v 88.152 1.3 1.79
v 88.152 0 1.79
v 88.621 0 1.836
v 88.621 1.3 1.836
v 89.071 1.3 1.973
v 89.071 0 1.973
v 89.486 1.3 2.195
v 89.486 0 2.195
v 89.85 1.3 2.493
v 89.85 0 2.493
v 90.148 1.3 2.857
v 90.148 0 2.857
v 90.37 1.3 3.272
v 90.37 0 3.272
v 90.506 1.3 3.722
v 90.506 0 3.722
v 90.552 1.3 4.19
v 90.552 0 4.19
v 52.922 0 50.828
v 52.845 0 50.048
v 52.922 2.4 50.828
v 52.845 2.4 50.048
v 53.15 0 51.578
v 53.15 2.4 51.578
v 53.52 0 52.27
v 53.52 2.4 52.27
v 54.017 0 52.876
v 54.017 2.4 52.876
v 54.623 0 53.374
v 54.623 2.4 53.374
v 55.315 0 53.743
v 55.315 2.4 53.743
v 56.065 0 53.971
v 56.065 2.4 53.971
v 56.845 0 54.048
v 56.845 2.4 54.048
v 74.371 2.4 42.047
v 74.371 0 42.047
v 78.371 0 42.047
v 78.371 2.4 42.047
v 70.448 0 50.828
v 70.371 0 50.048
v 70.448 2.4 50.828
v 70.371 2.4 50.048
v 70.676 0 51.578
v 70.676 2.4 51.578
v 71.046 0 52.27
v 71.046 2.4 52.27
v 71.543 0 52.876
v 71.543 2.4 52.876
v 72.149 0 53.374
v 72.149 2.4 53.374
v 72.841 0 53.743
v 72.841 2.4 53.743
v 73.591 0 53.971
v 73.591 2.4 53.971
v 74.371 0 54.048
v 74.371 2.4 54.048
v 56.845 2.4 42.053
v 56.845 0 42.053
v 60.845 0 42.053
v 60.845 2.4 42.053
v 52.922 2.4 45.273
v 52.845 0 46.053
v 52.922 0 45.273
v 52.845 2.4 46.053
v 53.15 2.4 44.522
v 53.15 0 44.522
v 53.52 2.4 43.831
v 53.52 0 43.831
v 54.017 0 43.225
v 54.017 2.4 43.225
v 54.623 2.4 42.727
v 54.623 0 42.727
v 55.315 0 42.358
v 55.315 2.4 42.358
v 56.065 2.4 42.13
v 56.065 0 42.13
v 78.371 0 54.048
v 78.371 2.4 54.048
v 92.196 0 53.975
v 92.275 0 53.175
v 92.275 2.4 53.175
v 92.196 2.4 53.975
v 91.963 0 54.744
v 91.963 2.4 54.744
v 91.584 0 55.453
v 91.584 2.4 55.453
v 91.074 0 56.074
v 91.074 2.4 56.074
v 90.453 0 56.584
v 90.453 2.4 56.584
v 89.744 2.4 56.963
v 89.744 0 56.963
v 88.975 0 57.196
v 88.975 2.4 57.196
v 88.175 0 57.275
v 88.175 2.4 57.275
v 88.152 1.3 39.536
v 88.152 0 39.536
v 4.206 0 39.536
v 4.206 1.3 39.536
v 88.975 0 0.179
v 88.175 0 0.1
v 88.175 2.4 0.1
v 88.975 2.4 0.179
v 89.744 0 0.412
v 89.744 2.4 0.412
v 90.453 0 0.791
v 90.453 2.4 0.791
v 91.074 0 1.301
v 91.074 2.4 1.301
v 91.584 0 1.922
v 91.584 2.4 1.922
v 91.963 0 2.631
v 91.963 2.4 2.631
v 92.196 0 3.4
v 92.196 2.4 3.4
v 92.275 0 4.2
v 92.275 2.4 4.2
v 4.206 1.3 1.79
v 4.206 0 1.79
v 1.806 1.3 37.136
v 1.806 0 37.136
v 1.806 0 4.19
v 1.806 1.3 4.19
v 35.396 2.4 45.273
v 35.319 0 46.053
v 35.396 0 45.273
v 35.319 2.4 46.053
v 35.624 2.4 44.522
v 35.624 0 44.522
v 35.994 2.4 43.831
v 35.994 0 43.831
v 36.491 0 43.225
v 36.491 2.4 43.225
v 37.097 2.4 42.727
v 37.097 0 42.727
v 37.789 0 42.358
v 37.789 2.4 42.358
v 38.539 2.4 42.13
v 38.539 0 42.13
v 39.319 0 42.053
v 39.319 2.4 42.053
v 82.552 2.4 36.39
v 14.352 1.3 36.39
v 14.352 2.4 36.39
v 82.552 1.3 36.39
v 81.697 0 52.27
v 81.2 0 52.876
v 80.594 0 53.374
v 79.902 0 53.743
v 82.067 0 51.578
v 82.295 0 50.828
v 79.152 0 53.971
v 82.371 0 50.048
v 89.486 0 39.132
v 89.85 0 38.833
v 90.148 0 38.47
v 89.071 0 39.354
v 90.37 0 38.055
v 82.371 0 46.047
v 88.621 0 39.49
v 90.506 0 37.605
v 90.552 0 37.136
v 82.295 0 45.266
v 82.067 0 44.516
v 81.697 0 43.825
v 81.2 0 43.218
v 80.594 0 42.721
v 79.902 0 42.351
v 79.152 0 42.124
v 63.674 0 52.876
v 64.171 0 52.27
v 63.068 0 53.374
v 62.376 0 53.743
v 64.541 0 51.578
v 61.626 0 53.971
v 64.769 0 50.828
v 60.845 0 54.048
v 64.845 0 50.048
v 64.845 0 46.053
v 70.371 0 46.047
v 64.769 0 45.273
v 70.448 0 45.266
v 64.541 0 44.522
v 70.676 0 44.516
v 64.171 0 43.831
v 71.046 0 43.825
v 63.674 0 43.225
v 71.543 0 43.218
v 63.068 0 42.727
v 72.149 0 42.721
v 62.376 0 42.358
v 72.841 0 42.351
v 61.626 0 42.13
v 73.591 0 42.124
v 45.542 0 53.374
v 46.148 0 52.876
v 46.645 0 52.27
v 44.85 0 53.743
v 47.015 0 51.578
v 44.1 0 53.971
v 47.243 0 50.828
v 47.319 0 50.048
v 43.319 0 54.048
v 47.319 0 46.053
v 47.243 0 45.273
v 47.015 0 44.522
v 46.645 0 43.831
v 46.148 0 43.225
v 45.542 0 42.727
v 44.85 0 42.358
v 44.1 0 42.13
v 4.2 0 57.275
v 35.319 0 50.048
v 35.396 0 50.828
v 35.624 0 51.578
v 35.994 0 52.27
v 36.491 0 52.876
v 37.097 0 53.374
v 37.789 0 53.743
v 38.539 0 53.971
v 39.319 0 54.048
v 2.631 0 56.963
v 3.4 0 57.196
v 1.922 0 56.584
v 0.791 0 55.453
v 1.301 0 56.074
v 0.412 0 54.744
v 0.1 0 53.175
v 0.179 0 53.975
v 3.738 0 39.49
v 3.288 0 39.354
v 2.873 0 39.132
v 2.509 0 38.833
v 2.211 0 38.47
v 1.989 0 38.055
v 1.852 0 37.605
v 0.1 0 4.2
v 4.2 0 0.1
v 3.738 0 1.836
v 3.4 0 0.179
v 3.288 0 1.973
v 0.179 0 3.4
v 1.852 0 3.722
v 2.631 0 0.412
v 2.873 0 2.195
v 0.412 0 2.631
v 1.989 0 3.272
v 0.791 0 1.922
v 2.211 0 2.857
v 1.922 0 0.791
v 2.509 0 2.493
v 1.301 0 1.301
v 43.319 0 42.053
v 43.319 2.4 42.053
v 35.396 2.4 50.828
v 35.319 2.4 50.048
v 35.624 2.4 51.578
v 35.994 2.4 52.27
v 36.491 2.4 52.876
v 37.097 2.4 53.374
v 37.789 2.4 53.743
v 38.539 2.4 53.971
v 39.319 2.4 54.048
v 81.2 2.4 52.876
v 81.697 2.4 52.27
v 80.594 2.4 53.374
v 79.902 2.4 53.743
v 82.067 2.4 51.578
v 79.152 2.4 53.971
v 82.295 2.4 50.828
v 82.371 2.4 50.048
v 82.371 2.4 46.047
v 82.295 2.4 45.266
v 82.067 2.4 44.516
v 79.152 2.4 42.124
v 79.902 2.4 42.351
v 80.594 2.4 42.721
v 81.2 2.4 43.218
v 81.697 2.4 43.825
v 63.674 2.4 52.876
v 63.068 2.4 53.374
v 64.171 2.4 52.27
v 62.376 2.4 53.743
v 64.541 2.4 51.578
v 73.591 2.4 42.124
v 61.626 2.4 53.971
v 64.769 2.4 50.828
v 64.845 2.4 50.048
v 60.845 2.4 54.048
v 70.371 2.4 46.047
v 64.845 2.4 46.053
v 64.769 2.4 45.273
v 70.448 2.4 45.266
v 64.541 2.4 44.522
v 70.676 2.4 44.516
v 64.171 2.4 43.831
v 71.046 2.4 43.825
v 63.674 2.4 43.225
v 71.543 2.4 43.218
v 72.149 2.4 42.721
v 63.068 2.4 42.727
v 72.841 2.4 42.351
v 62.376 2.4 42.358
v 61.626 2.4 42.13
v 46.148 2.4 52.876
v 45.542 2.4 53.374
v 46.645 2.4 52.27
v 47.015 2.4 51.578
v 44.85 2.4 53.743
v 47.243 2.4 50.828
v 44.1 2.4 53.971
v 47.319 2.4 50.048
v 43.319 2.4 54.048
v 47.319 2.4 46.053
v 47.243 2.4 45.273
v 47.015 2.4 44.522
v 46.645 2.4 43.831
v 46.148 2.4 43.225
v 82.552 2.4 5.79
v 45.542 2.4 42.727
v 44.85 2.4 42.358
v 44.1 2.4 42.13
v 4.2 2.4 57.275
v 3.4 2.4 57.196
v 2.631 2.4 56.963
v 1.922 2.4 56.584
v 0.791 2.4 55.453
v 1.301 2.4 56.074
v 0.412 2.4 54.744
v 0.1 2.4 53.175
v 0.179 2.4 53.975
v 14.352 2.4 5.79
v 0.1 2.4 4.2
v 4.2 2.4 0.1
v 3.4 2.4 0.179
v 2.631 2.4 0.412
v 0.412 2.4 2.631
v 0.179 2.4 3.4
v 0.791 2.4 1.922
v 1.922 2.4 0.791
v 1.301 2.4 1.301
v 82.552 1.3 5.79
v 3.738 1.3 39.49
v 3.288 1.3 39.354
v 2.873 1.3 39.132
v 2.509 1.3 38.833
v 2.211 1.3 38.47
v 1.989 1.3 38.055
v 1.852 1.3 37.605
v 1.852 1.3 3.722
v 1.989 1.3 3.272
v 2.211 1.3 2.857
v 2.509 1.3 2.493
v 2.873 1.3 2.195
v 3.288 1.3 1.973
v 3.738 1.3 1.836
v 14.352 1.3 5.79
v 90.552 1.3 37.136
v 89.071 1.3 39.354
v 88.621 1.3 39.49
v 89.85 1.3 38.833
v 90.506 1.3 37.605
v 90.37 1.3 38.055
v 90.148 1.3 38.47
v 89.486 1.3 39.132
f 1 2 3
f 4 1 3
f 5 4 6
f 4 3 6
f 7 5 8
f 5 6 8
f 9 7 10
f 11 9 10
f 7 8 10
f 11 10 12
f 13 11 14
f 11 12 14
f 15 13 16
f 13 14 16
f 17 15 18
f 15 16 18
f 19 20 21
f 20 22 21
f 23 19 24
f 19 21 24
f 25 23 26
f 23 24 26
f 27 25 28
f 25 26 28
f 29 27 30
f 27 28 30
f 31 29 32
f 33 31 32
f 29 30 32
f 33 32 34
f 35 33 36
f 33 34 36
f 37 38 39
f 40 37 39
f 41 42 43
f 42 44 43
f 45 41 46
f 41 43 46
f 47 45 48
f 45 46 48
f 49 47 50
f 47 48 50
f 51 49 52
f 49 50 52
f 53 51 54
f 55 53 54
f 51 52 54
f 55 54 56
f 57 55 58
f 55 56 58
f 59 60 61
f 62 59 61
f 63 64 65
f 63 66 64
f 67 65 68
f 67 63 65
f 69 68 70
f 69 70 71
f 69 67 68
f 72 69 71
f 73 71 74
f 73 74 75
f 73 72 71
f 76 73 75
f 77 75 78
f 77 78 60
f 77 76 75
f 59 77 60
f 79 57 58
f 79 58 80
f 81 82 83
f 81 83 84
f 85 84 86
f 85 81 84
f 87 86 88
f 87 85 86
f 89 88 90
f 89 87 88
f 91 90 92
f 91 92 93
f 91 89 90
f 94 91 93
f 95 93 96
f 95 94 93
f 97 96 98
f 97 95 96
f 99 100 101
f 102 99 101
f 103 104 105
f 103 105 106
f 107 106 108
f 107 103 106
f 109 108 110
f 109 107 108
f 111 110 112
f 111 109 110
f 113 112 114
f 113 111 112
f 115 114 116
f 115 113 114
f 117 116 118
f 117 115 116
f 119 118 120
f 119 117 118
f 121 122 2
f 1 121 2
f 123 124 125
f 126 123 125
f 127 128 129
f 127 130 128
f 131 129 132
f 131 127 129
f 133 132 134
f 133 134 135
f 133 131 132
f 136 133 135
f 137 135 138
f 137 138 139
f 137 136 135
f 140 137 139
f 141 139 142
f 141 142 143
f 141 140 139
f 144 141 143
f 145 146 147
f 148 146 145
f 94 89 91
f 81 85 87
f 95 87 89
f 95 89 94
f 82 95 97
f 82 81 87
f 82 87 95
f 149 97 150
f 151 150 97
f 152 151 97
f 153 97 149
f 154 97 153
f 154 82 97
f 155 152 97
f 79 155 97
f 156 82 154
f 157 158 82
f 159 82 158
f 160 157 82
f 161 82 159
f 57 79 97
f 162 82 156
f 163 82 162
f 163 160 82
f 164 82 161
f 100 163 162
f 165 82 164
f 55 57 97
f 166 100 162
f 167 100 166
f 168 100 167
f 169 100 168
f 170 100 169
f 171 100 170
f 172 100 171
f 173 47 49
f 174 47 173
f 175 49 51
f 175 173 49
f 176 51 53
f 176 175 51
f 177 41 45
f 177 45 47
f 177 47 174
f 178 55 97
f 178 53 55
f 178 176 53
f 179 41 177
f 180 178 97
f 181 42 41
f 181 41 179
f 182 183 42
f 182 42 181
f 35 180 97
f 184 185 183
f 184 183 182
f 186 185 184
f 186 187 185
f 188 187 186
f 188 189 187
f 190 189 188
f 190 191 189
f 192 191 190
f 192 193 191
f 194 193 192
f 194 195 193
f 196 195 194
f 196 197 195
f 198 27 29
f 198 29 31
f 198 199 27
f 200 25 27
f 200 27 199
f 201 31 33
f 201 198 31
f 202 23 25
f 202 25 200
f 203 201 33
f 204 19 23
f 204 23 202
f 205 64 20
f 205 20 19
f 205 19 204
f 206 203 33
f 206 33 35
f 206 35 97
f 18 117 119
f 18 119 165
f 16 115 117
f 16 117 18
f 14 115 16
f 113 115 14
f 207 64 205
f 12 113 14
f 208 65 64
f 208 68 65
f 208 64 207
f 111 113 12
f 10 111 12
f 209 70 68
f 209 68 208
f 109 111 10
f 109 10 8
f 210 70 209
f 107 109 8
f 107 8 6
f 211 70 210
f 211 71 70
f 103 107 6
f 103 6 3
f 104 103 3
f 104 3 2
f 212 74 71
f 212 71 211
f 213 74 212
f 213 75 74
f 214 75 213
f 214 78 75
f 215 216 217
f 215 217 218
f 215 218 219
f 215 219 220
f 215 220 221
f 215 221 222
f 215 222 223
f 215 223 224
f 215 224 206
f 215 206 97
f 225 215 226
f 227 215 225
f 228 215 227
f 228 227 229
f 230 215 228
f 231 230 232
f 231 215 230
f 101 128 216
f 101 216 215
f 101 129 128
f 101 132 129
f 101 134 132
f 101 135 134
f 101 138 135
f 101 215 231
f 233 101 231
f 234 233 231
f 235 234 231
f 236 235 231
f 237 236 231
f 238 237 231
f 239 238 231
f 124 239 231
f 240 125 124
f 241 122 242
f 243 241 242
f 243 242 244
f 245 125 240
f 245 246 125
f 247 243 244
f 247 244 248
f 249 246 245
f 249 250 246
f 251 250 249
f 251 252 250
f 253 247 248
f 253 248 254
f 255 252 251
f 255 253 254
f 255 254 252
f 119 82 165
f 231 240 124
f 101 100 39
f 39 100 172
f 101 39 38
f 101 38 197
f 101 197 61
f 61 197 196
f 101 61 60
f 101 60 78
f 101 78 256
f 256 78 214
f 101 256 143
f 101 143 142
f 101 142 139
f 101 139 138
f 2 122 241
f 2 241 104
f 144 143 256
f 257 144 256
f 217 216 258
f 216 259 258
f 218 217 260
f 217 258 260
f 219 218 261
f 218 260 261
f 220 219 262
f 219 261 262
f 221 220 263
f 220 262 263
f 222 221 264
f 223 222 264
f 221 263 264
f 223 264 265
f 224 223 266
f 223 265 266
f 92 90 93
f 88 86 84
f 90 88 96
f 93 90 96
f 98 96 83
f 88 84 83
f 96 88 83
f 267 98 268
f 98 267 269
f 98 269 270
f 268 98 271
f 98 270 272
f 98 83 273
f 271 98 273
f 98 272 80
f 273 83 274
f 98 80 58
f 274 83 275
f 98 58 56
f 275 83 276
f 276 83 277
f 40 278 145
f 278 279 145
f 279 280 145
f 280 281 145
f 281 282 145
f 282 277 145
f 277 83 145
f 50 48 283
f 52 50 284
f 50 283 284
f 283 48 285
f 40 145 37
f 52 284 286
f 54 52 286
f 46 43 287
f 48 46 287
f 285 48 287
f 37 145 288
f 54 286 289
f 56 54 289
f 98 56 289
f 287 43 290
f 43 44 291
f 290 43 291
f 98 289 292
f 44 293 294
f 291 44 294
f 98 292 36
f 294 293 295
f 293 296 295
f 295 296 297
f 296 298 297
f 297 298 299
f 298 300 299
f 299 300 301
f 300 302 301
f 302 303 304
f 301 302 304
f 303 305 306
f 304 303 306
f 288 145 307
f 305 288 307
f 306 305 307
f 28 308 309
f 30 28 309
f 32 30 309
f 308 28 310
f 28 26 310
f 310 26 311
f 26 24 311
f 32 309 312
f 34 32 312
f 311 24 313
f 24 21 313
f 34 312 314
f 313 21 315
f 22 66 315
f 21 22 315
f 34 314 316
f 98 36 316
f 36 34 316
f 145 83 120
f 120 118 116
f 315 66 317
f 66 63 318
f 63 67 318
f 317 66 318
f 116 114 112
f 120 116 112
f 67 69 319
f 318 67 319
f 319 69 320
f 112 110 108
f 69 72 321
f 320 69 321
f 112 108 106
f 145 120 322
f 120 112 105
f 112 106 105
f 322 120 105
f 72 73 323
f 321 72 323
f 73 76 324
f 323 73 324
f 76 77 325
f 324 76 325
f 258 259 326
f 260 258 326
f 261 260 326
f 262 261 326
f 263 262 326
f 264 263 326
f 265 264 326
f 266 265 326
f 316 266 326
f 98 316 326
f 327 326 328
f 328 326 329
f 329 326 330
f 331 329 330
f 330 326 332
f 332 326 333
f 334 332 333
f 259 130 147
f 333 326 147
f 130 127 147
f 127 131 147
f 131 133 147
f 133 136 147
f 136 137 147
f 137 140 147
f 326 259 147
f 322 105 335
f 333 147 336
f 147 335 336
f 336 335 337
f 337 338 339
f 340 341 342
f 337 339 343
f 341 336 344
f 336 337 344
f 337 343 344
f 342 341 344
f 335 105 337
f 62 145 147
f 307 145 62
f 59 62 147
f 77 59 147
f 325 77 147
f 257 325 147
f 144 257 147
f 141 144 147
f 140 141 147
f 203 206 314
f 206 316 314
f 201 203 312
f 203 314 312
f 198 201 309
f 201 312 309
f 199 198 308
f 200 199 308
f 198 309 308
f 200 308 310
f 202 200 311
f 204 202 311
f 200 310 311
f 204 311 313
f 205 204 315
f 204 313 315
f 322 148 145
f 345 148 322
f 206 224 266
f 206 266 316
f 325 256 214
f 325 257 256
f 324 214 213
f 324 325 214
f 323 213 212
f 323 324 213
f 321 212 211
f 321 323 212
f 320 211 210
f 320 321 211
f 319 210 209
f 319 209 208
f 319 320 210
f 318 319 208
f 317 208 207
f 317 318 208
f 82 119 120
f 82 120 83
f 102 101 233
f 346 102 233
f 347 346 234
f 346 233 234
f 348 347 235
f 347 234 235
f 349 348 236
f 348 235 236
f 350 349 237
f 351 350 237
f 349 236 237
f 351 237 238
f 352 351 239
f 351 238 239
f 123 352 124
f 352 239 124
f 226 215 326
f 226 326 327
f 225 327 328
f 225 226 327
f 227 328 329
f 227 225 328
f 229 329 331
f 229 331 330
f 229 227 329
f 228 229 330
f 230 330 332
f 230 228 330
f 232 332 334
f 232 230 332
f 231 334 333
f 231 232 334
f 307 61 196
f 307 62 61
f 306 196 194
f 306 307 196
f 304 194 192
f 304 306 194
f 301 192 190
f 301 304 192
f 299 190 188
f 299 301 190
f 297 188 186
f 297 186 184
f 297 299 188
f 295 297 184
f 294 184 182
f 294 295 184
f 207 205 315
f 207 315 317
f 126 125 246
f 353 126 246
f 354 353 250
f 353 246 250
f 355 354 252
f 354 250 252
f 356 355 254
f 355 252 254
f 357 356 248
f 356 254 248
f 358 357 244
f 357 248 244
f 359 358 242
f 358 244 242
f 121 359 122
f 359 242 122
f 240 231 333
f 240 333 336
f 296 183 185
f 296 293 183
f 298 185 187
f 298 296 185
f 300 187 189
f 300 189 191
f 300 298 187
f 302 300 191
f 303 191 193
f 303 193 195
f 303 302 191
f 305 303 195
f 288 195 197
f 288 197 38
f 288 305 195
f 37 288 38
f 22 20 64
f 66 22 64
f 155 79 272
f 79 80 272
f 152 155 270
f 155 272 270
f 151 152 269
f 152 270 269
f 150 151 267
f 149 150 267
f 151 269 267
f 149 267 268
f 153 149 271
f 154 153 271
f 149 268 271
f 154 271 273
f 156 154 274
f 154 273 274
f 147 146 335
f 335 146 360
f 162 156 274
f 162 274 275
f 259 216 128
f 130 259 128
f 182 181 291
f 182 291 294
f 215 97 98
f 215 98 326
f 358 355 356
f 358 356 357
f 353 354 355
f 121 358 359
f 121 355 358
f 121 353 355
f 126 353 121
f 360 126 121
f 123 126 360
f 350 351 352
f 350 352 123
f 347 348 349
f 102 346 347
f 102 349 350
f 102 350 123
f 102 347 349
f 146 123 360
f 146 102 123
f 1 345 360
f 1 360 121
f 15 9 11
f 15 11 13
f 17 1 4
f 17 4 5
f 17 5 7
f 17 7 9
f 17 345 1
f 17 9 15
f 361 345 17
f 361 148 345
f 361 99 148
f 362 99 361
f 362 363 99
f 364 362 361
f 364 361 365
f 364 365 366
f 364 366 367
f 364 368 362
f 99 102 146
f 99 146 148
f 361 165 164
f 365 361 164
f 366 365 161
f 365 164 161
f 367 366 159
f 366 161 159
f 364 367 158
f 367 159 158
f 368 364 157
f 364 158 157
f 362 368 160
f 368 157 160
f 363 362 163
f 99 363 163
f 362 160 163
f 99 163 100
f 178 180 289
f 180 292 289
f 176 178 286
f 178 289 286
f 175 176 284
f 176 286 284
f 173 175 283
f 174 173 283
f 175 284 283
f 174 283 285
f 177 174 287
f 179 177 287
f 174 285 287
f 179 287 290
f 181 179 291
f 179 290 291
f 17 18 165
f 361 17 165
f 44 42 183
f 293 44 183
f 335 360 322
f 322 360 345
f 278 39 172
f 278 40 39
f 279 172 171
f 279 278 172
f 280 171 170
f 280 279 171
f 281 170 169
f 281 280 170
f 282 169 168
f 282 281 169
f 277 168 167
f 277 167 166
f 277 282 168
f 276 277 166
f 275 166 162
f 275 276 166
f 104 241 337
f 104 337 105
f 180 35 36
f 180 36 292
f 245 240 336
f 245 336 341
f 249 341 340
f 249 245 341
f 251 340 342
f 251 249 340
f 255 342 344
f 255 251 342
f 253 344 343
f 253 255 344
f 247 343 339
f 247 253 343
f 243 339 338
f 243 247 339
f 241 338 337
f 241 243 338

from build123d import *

# Parameters (mm, degrees)
SKETCH_1_W          = 11.999999915
SKETCH_1_H          = 11.994665989
SKETCH_1_W_2        = 11.999999916
SKETCH_1_H_2        = 12.000914401
SKETCH_1_W_3        = 68.2
SKETCH_1_H_3        = 30.6
EXTRUDE_1_DEPTH     = 2.4
CUT_EXTRUDE_1_DEPTH = 1.3
FILLET_1_R          = 4


with BuildPart() as part:
    # 草图1 → 凸台-拉伸1 (new body)
    with BuildSketch(Plane(origin=(0, 0, 0), x_dir=(1, 0, 0), z_dir=(0, 1, 0))):
        with BuildLine():
            Line((4.2, -0.1), (88.17478029, -0.1))
            ThreePointArc((88.17478029, -0.1), (91.073918092, -1.300862197), (92.27478029, -4.2))
            Line((92.27478029, -4.2), (92.27478029, -53.174709169))
            ThreePointArc((92.27478029, -53.174709169), (91.073918092, -56.073846972), (88.17478029, -57.274709169))
            Line((88.17478029, -57.274709169), (4.2, -57.274709169))
            ThreePointArc((4.2, -57.274709169), (1.300862197, -56.073846972), (0.1, -53.174709169))
            Line((0.1, -53.174709169), (0.1, -4.2))
            ThreePointArc((0.1, -4.2), (1.300862197, -1.300862197), (4.2, -0.1))
        make_face()
        with Locations((41.319380239, -48.050393701)):
            Rectangle(SKETCH_1_W, SKETCH_1_H, mode=Mode.SUBTRACT)
        with Locations((58.845415291, -48.050393701)):
            Rectangle(SKETCH_1_W, SKETCH_1_H, mode=Mode.SUBTRACT)
        with Locations((76.371450343, -48.047269495)):
            Rectangle(SKETCH_1_W_2, SKETCH_1_H_2, mode=Mode.SUBTRACT)
        with Locations((48.452479045, -21.09040811)):
            Rectangle(SKETCH_1_W_3, SKETCH_1_H_3, mode=Mode.SUBTRACT)
    extrude(amount=EXTRUDE_1_DEPTH)

    # 草图2 → 切除-拉伸1 (cut)
    with BuildSketch(Plane.XZ):
        with BuildLine():
            Line((88.152479045, 39.536375413), (4.206301753, 39.536375413))
            ThreePointArc((4.206301753, 39.536375413), (2.509245478, 38.833431688), (1.806301753, 37.136375413))
            Line((1.806301753, 37.136375413), (1.806301753, 4.190299721))
            ThreePointArc((1.806301753, 4.190299721), (2.509245478, 2.493243446), (4.206301753, 1.790299721))
            Line((4.206301753, 1.790299721), (88.152479045, 1.790299721))
            ThreePointArc((88.152479045, 1.790299721), (89.84953532, 2.493243446), (90.552479045, 4.190299721))
            Line((90.552479045, 4.190299721), (90.552479045, 37.136375413))
            ThreePointArc((90.552479045, 37.136375413), (89.84953532, 38.833431688), (88.152479045, 39.536375413))
        make_face()
    extrude(amount=-CUT_EXTRUDE_1_DEPTH, mode=Mode.SUBTRACT)

    # 圆角1
    fillet_1_edges = [part.edges().sort_by_distance(p)[0] for p in [
        (70.371450385, 1.2, 42.046812294),
        (70.371450385, 1.2, 54.047726695),
        (82.371450301, 1.2, 54.047726695),
        (82.371450301, 1.2, 42.046812294),
        (52.845415333, 1.2, 42.053060706),
        (52.845415333, 1.2, 54.047726695),
        (64.845415248, 1.2, 54.047726695),
        (64.845415248, 1.2, 42.053060706),
        (35.319380281, 1.2, 42.053060706),
        (35.319380281, 1.2, 54.047726695),
        (47.319380196, 1.2, 54.047726695),
        (47.319380196, 1.2, 42.053060706),
    ]]
    fillet(fillet_1_edges, radius=FILLET_1_R)


solid = part.part
